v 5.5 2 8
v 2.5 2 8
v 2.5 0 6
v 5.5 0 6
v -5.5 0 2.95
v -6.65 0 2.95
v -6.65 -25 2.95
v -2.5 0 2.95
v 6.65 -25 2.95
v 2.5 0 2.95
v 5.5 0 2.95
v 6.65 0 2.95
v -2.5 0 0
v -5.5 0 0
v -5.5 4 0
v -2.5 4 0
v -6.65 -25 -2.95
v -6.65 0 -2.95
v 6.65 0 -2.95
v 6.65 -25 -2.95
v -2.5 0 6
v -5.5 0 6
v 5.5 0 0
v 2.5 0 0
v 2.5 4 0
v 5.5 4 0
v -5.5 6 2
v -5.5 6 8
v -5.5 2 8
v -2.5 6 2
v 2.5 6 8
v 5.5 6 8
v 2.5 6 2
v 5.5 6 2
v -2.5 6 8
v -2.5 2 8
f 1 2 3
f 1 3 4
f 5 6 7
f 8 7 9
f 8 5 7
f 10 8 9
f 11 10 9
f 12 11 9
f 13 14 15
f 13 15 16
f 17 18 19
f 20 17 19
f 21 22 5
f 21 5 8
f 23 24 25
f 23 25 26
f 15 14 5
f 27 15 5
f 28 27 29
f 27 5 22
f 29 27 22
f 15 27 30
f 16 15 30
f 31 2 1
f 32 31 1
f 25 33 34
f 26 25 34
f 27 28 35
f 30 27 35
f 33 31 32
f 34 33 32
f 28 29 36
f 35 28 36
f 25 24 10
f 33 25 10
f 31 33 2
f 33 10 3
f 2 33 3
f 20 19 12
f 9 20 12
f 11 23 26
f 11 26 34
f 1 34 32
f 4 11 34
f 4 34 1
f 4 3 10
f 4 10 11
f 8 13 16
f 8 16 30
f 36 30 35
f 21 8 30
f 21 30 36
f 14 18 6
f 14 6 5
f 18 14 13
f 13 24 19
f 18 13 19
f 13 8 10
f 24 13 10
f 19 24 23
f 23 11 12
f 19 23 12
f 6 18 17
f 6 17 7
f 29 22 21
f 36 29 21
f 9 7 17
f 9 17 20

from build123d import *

# Parameters (mm, degrees)
F0_W     = 13.3
F0_H     = 5.9
F1_DEPTH = 25
F2_W     = 3
F2_H     = 8
F3_DEPTH = 6
F4_SIZE  = 2


with BuildPart() as f1:
    # F0 (on Front) → F1 (new body)
    with BuildSketch(Plane.XZ):
        Rectangle(F0_W, F0_H)
    extrude(amount=F1_DEPTH)

    # F2 (on Front) → F3 (join)
    with BuildSketch(Plane.XZ):
        with Locations((-4, 4)):
            Rectangle(F2_W, F2_H)
        with Locations((4, 4)):
            Rectangle(F2_W, F2_H)
    extrude(amount=-F3_DEPTH)

    # F4
    f4_edges = [f1.edges().sort_by_distance(p)[0] for p in [
        (-4, 0, 8),
        (4, 0, 8),
        (4, 6, 0),
        (-4, 6, 0),
    ]]
    chamfer(f4_edges, length=F4_SIZE)


solid = f1.part
